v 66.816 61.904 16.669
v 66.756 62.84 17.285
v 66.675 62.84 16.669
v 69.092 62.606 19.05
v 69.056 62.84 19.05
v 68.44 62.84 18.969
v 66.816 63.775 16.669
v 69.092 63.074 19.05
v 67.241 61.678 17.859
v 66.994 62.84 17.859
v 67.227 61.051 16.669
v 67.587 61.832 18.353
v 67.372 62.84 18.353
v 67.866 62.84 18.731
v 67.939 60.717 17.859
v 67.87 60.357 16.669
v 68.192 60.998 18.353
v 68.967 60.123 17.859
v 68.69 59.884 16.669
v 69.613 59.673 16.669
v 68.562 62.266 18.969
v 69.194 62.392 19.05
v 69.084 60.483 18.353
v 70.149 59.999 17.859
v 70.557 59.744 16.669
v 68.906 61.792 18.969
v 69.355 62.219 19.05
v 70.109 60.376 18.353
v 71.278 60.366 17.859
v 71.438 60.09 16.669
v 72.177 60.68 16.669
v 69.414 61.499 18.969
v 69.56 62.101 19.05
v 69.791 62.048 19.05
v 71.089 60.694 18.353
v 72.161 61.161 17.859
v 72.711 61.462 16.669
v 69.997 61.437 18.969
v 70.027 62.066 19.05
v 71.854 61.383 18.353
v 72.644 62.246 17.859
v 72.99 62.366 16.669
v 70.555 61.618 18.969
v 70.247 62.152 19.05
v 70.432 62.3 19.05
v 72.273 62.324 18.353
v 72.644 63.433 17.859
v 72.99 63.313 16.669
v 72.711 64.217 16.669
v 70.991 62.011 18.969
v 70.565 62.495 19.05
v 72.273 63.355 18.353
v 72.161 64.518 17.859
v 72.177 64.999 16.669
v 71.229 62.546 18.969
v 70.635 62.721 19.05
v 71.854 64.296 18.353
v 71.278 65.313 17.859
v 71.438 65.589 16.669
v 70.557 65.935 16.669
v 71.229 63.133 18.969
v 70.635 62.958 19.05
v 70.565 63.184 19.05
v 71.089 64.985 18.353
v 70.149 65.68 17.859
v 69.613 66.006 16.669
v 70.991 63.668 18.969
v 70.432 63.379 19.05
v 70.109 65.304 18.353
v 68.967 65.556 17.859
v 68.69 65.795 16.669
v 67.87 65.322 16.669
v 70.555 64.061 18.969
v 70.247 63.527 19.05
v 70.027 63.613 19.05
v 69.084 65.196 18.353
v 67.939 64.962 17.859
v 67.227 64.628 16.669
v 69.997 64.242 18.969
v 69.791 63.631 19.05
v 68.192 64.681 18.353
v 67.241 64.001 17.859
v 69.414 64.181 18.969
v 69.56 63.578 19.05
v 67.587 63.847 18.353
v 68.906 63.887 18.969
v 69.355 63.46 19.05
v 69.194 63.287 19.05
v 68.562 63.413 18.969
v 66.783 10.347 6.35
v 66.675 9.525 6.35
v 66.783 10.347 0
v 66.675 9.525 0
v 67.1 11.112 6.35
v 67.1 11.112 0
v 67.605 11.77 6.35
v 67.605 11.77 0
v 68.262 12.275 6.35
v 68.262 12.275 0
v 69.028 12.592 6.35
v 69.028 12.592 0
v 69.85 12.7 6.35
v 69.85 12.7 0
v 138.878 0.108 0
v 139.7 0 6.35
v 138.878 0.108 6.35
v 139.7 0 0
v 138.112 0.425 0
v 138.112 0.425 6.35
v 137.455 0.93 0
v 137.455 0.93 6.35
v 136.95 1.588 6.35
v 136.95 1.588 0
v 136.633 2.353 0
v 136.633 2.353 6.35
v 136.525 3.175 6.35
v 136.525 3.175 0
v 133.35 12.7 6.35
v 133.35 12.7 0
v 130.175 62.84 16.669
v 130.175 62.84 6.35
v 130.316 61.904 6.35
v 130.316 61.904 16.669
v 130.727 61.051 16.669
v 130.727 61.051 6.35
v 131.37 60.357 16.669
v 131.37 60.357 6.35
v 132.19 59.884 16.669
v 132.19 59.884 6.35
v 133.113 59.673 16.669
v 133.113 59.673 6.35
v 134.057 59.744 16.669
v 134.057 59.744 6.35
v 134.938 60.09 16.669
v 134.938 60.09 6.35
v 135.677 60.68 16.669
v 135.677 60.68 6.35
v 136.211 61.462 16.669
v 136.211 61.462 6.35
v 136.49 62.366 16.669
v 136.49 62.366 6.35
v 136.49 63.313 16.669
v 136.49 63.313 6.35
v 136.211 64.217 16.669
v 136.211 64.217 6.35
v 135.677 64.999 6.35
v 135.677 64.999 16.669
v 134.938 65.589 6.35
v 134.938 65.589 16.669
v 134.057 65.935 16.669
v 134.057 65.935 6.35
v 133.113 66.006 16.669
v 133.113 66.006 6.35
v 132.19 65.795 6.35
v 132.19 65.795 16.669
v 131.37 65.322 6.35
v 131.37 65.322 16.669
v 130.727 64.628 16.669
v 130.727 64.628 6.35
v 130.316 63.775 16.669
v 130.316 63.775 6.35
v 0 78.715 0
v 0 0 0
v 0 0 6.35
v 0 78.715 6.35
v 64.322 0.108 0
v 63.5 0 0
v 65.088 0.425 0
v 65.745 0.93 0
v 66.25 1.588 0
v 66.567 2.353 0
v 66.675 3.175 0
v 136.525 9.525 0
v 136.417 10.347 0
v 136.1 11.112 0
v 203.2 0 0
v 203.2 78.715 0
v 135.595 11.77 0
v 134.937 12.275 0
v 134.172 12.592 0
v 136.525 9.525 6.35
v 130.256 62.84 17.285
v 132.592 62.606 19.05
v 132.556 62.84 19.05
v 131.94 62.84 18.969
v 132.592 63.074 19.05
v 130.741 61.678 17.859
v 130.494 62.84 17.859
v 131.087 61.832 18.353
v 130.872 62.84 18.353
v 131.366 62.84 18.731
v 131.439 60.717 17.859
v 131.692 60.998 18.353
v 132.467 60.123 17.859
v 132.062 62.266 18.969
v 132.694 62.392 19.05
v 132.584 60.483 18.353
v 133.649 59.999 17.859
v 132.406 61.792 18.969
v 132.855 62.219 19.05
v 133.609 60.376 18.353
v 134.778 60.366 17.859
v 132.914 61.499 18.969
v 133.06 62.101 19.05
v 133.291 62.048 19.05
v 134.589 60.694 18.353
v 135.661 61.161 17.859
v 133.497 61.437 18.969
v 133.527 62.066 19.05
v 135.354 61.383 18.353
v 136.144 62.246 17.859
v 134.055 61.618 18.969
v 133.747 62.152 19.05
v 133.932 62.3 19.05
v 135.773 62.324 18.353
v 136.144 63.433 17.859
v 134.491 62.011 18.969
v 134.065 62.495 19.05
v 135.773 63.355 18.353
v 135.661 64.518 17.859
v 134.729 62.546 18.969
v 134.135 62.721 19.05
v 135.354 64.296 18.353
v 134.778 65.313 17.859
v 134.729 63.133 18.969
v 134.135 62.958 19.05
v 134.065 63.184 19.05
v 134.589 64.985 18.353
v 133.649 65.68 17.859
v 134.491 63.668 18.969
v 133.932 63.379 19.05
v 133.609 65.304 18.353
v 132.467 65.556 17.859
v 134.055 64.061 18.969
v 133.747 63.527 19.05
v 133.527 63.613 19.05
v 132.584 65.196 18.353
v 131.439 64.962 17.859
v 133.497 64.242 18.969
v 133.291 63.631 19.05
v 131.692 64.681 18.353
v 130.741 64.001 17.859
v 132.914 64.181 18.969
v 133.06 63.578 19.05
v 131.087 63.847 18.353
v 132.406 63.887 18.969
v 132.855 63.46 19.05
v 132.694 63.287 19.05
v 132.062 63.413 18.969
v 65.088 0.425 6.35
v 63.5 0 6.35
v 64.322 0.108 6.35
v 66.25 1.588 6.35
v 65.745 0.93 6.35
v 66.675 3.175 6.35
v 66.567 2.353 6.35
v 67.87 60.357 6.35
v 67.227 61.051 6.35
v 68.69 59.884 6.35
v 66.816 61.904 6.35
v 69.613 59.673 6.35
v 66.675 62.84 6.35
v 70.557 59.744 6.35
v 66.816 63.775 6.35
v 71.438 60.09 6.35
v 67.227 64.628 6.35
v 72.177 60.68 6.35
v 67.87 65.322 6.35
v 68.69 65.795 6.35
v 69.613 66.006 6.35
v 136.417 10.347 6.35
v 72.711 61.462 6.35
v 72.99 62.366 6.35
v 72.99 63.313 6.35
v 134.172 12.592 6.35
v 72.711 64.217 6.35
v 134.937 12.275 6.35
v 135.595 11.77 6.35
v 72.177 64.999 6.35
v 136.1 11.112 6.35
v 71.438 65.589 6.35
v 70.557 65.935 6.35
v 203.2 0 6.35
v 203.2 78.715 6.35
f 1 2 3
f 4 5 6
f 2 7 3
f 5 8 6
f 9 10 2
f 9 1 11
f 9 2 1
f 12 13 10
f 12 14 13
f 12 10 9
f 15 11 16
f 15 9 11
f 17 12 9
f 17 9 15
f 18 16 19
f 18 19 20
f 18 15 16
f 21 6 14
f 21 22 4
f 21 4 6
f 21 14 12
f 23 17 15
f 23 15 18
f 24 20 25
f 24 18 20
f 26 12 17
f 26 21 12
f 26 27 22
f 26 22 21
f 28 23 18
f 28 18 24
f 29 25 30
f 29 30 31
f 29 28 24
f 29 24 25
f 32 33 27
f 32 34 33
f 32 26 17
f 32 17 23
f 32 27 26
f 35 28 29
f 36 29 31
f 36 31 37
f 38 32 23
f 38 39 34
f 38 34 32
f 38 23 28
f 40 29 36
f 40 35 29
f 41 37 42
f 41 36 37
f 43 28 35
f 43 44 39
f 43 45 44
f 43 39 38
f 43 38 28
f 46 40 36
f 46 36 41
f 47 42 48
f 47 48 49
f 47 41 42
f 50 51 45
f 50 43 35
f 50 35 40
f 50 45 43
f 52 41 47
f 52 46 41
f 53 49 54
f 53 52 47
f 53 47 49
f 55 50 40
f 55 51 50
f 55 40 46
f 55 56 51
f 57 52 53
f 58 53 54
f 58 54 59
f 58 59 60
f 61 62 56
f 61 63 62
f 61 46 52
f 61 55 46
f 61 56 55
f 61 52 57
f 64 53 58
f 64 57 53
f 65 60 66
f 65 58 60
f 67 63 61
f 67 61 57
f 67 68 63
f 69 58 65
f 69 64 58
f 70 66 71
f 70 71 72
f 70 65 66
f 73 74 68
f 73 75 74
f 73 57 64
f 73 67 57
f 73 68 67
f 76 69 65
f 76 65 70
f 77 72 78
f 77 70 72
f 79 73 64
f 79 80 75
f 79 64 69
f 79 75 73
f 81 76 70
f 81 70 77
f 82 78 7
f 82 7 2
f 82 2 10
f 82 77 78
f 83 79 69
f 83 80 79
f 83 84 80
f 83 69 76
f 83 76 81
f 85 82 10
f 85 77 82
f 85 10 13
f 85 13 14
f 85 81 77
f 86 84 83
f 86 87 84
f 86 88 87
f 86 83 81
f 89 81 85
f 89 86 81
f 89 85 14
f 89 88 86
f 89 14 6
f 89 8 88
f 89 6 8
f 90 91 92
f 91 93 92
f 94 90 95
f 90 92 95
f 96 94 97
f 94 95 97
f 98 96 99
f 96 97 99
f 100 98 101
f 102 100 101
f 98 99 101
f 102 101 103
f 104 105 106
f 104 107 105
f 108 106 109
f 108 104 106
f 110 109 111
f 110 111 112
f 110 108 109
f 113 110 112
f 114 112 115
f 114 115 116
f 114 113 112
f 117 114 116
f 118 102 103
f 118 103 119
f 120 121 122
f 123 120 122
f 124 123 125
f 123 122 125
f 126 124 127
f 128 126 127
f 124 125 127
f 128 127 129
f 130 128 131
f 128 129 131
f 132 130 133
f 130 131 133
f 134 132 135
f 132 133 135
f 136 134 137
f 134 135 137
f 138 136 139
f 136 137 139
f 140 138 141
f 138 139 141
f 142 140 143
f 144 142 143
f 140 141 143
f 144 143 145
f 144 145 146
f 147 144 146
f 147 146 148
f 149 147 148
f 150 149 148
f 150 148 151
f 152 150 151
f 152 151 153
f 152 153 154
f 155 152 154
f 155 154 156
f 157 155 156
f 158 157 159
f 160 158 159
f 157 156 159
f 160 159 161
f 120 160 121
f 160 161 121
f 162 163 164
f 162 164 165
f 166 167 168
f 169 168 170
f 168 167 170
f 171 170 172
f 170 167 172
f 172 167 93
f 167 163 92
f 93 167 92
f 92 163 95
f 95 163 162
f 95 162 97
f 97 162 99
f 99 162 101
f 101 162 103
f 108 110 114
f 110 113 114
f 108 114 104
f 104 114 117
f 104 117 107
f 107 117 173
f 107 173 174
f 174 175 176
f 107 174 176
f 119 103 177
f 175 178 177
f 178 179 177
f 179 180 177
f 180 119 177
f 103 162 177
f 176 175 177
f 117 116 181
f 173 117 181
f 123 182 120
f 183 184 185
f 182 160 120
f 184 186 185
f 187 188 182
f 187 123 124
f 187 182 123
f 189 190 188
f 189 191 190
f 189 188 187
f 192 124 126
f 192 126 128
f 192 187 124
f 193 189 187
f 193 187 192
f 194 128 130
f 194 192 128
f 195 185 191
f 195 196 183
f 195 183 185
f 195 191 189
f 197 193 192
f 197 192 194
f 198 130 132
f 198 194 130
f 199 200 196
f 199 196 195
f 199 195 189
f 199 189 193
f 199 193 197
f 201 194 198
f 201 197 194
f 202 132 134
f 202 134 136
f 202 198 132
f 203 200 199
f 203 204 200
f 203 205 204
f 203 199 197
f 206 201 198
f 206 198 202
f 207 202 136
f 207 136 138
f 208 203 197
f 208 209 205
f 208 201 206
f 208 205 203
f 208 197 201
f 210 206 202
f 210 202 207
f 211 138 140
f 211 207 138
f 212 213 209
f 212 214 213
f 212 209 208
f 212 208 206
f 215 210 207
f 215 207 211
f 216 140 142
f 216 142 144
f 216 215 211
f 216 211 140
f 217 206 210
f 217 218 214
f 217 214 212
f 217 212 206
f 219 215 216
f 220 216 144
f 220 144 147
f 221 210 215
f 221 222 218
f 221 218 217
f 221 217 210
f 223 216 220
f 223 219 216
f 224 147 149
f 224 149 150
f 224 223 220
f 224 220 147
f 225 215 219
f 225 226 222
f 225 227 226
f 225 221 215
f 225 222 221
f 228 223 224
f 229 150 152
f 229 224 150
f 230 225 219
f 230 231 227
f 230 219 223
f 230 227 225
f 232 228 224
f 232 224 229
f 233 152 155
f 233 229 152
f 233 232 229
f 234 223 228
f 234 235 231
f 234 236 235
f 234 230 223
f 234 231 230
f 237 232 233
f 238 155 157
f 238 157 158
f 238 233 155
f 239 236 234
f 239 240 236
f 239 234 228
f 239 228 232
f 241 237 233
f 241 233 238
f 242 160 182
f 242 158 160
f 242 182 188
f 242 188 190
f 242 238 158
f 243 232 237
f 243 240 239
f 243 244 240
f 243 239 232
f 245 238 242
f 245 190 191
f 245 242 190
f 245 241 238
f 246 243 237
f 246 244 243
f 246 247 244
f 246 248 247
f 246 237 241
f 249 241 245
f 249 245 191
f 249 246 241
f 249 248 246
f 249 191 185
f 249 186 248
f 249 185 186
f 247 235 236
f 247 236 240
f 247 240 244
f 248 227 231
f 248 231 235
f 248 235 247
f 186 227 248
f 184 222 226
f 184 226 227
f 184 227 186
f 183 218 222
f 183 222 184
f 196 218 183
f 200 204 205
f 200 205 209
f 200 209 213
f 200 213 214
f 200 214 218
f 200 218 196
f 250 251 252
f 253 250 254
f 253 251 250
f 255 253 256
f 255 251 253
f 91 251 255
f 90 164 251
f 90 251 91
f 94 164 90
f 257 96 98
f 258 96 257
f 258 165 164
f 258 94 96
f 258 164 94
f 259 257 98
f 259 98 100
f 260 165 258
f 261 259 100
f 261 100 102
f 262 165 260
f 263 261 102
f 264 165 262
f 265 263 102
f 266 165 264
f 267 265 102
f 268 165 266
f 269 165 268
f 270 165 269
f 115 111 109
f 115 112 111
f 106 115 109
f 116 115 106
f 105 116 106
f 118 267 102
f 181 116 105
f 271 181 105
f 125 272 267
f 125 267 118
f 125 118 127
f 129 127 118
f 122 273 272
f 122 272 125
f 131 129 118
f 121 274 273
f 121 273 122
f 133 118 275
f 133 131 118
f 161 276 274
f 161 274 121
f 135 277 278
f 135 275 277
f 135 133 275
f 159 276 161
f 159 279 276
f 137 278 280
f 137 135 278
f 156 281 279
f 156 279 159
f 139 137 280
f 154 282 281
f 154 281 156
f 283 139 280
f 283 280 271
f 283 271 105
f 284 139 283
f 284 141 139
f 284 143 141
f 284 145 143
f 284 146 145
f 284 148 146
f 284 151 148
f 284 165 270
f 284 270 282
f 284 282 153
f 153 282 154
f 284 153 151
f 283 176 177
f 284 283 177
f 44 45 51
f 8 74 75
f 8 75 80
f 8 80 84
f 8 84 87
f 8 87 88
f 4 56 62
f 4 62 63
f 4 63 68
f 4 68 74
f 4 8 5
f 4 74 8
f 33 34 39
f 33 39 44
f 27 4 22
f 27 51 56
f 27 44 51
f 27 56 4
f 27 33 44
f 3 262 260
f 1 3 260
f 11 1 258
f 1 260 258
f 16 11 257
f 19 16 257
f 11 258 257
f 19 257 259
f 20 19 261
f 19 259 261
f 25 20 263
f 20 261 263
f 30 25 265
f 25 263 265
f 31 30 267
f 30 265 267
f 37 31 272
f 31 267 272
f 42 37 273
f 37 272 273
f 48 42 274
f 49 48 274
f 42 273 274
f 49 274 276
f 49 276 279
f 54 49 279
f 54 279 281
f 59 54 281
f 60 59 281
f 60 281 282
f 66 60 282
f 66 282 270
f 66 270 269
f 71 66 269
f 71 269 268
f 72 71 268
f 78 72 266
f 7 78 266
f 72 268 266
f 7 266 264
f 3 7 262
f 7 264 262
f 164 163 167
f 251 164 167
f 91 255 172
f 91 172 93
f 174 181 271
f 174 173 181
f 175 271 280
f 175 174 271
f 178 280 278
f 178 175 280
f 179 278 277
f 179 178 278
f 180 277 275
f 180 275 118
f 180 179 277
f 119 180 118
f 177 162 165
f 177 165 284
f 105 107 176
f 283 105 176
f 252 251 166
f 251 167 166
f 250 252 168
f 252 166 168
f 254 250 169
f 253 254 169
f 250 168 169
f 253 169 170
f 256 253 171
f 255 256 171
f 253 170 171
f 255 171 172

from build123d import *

# Parameters (mm, degrees)
SKETCH1_W           = 203.2
SKETCH1_H           = 78.7146
BOSS_EXTRUDE1_DEPTH = 6.35
SKETCH2_W           = 69.85
SKETCH2_H           = 12.7
CUT_EXTRUDE1_DEPTH  = 219.005850273
FILLET1_R           = 3.175
SKETCH3_R           = 3.175
BOSS_EXTRUDE2_DEPTH = 12.7
FILLET2_R           = 2.38125


with BuildPart() as part:
    # Sketch1 → Boss-Extrude1 (new body)
    with BuildSketch(Plane.XY):
        with Locations((101.6, 39.3573)):
            Rectangle(SKETCH1_W, SKETCH1_H)
    extrude(amount=BOSS_EXTRUDE1_DEPTH)

    # Sketch2 → Cut-Extrude1 (cut, through all)
    with BuildSketch(Plane.XY.offset(6.35)):
        with Locations((101.6, 6.35)):
            Rectangle(SKETCH2_W, SKETCH2_H)
    extrude(amount=-CUT_EXTRUDE1_DEPTH, mode=Mode.SUBTRACT)

    # Fillet1
    fillet1_edges = [part.edges().sort_by_distance(p)[0] for p in [
        (66.675, 0, 3.175),
        (66.675, 12.7, 3.175),
        (136.525, 12.7, 3.175),
        (136.525, 0, 3.175),
    ]]
    fillet(fillet1_edges, radius=FILLET1_R)

    # Sketch3 → Boss-Extrude2 (add)
    with BuildSketch(Plane.XY.offset(6.35)):
        with Locations(Location((69.85, 62.8396, 0), (0, 0, 180))):
            Circle(SKETCH3_R)
        with Locations(Location((133.35, 62.8396, 0), (0, 0, 180))):
            Circle(SKETCH3_R)
    extrude(amount=BOSS_EXTRUDE2_DEPTH)

    # Fillet2
    fillet2_edges = [part.edges().sort_by_distance(p)[0] for p in [
        (73.025, 62.8396, 19.05),
        (136.525, 62.8396, 19.05),
    ]]
    fillet(fillet2_edges, radius=FILLET2_R)


solid = part.part
